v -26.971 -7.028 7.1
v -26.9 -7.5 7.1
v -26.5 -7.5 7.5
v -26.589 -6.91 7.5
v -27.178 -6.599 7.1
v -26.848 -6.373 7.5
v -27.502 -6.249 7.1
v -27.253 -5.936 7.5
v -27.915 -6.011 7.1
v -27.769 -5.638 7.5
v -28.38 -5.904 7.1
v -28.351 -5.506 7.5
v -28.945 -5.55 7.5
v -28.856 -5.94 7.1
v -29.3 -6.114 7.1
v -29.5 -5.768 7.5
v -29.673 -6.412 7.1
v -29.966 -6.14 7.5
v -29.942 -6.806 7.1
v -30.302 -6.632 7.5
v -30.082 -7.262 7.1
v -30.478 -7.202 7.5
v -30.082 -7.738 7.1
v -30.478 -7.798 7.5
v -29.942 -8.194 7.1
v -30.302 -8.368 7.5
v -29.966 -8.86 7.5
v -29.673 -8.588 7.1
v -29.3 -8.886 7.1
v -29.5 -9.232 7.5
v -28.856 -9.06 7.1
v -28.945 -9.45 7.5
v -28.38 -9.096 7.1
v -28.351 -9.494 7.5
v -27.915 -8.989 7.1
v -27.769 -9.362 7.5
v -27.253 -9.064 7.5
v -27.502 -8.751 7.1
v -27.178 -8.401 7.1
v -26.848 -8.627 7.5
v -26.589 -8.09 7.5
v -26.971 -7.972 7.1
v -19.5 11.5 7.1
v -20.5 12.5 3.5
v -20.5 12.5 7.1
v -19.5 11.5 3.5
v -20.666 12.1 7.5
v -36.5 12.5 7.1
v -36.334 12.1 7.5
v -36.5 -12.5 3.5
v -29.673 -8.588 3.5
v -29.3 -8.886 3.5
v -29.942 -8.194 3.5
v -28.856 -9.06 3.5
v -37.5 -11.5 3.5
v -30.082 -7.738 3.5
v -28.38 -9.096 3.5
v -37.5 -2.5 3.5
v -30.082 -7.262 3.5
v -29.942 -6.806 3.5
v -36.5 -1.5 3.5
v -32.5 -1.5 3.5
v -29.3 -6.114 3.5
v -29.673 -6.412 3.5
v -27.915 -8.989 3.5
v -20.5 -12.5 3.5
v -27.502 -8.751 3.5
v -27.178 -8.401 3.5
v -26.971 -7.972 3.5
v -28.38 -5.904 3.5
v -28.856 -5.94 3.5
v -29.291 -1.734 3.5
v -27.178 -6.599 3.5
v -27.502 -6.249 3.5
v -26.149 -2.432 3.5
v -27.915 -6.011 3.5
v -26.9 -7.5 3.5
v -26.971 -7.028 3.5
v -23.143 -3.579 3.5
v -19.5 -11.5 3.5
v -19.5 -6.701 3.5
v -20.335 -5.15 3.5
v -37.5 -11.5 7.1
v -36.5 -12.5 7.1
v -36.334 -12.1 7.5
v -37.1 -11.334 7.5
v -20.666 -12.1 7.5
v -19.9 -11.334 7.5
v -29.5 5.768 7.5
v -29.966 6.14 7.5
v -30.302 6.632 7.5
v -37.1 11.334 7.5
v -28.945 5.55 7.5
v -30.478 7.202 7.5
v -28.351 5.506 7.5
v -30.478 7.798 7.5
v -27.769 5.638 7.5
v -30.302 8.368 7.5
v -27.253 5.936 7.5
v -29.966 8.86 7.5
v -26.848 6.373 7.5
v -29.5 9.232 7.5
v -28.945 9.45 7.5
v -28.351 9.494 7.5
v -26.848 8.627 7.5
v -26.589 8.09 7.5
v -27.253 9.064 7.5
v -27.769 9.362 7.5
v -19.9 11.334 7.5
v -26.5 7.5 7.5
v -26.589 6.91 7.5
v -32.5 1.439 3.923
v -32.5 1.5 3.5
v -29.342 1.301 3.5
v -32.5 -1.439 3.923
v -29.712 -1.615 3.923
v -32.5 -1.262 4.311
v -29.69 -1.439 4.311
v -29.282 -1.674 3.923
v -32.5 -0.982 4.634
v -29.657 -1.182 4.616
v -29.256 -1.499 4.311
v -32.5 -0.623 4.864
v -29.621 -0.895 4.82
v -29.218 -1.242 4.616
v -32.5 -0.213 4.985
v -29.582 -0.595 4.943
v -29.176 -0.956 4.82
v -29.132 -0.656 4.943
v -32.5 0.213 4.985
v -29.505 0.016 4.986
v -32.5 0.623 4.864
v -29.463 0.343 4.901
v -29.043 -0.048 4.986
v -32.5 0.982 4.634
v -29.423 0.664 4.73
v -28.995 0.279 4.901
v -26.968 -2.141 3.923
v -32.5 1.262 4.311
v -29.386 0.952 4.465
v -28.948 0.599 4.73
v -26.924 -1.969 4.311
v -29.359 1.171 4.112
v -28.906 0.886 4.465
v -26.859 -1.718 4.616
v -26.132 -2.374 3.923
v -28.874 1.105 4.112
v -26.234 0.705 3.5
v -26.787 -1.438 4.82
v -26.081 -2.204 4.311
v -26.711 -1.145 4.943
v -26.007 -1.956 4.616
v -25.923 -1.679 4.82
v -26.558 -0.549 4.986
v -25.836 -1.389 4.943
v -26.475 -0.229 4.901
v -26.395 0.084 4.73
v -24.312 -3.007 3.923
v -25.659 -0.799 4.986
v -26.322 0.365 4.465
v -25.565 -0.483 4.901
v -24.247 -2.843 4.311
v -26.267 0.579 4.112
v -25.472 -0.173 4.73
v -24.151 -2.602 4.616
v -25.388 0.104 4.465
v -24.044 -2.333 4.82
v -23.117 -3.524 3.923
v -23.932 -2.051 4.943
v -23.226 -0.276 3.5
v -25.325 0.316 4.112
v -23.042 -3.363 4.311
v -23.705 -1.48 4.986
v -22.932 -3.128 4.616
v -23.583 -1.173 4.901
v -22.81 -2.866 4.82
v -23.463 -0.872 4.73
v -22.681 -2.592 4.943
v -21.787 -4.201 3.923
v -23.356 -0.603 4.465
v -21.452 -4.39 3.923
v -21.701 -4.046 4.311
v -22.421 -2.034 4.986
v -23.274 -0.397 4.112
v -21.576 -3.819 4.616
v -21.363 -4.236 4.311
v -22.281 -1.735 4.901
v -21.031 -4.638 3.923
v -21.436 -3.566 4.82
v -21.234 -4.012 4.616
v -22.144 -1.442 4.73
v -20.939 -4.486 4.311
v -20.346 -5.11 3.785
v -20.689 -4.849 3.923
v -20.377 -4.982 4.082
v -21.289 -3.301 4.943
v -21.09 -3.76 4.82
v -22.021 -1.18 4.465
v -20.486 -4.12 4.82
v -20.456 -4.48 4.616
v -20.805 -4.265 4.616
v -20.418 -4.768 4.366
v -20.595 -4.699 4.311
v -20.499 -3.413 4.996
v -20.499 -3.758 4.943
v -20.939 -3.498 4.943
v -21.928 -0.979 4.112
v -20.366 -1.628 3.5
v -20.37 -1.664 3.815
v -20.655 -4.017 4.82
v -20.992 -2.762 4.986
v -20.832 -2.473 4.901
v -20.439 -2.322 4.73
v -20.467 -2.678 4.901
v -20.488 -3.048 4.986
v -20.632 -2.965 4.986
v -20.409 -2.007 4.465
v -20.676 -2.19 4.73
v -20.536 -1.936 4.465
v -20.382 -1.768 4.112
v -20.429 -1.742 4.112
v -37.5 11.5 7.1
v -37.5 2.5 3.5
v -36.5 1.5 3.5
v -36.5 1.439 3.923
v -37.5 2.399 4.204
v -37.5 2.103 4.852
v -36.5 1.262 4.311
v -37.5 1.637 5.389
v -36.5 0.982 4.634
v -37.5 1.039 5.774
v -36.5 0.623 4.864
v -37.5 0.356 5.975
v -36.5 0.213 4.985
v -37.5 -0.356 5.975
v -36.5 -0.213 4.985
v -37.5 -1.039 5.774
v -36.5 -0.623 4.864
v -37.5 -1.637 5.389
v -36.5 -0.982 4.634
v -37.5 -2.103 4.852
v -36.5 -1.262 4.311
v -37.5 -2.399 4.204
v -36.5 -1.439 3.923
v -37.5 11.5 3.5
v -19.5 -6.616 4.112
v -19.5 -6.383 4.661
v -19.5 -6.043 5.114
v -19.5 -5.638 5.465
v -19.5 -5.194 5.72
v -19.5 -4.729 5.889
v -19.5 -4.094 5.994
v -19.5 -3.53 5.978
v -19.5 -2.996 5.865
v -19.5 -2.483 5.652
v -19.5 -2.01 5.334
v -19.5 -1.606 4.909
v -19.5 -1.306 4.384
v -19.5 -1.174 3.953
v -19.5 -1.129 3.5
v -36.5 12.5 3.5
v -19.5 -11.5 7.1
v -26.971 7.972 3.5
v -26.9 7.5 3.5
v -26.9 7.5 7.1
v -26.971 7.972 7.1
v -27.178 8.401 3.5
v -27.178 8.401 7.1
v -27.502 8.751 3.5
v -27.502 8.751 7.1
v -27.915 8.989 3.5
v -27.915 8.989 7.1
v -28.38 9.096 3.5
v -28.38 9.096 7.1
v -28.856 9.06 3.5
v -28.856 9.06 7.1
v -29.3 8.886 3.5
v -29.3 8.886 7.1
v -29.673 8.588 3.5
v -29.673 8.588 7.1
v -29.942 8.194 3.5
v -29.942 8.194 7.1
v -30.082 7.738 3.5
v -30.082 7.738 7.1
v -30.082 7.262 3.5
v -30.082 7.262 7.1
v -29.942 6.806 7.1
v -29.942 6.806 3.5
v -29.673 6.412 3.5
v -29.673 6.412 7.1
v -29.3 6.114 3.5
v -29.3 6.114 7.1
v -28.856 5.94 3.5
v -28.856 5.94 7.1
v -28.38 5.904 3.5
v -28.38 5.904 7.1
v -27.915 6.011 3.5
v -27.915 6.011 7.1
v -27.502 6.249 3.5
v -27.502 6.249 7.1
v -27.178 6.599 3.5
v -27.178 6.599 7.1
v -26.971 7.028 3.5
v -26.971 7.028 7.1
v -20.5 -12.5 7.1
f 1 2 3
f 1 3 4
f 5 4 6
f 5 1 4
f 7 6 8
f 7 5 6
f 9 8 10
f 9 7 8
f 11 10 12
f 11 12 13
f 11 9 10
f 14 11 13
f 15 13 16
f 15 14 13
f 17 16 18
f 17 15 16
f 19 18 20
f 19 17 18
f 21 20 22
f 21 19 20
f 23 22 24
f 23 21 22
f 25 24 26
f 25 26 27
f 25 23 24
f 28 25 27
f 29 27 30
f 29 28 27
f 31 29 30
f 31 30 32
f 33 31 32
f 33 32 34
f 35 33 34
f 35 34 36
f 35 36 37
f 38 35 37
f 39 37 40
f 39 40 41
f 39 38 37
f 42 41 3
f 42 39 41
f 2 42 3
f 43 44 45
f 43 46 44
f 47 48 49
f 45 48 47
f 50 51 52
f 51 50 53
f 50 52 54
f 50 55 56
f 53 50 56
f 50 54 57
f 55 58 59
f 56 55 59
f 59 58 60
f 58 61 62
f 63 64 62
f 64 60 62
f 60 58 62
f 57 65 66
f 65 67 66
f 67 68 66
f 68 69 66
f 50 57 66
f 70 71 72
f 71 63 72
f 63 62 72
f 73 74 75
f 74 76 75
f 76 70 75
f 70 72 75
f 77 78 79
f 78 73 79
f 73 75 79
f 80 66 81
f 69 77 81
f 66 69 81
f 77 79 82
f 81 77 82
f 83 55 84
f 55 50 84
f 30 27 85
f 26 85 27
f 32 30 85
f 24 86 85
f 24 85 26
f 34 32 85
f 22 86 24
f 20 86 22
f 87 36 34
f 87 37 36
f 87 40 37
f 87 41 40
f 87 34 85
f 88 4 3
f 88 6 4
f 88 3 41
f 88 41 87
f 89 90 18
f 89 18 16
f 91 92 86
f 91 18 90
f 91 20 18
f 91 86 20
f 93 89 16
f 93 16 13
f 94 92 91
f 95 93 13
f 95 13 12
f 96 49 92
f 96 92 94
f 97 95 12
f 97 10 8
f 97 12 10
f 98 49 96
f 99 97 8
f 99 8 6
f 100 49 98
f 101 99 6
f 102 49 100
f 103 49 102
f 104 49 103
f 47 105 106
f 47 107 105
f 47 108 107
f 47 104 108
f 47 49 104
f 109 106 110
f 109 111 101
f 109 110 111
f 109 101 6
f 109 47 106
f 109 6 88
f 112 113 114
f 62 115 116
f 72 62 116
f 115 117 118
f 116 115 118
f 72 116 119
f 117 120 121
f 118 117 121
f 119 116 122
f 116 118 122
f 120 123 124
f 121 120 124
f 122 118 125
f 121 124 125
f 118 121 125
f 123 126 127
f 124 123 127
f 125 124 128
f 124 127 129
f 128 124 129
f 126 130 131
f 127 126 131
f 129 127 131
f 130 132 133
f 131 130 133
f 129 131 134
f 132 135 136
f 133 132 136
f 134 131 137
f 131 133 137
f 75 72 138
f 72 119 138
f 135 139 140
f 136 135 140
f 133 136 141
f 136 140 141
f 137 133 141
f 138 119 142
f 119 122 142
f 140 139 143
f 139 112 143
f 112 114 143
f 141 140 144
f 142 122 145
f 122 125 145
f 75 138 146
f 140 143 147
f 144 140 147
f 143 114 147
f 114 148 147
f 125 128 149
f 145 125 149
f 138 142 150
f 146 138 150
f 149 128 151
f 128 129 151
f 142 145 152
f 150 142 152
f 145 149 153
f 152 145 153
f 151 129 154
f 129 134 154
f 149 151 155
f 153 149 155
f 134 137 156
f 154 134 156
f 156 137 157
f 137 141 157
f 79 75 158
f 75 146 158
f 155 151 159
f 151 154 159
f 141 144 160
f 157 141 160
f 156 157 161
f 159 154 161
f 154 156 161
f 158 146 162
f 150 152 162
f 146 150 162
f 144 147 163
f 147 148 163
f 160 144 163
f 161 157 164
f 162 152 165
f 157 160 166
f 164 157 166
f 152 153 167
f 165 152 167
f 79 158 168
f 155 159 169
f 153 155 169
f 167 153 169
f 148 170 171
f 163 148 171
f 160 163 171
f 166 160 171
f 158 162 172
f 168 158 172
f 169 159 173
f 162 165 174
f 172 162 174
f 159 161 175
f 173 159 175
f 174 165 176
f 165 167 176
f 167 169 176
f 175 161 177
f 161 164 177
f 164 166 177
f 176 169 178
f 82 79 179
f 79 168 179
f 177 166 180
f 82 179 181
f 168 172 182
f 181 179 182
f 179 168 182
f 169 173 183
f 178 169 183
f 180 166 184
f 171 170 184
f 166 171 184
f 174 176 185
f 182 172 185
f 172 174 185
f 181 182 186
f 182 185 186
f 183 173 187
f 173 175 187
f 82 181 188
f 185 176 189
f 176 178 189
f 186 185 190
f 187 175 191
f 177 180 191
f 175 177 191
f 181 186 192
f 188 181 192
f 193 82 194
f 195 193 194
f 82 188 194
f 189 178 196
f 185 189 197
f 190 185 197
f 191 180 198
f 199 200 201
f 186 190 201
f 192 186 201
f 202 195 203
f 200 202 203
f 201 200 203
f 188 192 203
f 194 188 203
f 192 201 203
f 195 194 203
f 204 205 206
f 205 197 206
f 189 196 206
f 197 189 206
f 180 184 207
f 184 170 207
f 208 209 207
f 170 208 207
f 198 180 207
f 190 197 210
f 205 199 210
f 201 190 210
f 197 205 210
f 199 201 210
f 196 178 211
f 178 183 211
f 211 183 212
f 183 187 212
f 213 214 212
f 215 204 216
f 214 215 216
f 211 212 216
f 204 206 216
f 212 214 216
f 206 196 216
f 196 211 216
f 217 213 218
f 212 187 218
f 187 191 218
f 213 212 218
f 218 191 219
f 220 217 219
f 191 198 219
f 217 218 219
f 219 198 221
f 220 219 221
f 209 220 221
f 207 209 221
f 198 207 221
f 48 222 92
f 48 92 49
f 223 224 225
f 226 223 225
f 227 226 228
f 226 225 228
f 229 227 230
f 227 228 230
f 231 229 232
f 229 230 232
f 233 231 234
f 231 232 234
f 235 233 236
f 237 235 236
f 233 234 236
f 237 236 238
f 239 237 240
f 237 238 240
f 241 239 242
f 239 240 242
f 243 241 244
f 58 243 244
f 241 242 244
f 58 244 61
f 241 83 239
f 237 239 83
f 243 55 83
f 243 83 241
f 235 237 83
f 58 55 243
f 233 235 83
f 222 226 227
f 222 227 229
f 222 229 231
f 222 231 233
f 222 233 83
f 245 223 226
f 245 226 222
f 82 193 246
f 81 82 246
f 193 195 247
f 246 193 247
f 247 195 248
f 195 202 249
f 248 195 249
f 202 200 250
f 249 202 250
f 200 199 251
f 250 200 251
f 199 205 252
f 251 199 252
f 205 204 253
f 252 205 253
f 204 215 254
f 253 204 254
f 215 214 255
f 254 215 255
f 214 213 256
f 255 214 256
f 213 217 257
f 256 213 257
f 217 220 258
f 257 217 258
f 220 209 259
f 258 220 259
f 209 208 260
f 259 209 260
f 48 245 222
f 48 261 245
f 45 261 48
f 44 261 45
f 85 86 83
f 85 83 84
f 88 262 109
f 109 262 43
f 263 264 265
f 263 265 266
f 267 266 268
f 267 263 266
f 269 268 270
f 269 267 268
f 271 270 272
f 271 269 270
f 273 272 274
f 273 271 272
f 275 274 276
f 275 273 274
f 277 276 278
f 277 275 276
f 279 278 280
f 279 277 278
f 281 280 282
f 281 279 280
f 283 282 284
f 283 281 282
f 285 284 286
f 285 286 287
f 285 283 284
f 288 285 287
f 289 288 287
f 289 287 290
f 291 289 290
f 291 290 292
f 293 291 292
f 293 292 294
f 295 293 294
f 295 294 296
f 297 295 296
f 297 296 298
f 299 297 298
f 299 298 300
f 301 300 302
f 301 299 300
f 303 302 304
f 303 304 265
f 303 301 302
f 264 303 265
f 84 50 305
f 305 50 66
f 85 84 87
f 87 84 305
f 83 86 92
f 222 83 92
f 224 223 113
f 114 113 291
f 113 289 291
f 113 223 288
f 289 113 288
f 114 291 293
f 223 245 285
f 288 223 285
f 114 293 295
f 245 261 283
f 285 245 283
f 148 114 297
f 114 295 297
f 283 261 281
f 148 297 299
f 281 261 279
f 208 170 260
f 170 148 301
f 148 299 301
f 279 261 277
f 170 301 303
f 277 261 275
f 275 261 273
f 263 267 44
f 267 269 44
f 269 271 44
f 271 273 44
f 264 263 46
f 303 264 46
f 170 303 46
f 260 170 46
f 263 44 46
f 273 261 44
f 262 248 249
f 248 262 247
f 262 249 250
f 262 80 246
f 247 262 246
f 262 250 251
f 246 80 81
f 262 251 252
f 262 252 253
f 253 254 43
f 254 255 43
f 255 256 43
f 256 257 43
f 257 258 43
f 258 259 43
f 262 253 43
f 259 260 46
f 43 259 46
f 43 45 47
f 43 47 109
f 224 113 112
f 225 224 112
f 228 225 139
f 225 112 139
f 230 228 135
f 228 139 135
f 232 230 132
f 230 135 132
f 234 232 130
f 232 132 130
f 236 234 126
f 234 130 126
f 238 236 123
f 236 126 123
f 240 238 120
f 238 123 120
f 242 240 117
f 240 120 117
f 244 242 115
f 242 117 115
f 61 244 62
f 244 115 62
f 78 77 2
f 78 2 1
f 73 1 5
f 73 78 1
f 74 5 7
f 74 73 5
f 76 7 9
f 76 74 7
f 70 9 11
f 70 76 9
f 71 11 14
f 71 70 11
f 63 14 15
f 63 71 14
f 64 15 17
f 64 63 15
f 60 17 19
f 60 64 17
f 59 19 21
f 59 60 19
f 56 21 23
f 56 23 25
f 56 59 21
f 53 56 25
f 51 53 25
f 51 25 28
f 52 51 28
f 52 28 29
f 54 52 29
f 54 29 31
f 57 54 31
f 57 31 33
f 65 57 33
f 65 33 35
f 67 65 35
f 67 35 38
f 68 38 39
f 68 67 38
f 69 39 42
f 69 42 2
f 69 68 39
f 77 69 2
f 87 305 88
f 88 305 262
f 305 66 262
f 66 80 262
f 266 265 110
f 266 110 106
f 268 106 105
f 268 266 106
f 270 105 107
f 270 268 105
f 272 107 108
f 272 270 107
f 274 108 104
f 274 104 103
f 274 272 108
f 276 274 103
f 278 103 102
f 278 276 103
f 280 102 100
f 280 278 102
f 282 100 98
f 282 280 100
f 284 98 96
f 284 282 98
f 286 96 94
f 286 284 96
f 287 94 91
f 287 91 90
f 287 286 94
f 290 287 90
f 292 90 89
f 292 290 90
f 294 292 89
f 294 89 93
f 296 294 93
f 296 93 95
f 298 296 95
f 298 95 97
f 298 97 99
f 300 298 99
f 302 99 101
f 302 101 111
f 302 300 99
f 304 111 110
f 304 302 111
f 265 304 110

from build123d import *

# Parameters (mm, degrees)
SKETCH027_W     = 18
SKETCH027_H     = 25
SKETCH027_R     = 1.6
PAD008_DEPTH    = 4
SKETCH028_R     = 1.5
CHAMFER011_SIZE = 1
CHAMFER033_SIZE = 1
CHAMFER039_SIZE = 0.4


with BuildPart() as part:
    # Sketch027 (on Binder) → Pad008 (new body)
    with BuildSketch(Plane.XY):
        with Locations((-28.5, 0)):
            Rectangle(SKETCH027_W, SKETCH027_H)
        with Locations((-28.5, 7.5)):
            Circle(SKETCH027_R, mode=Mode.SUBTRACT)
        with Locations((-28.5, -7.5)):
            Circle(SKETCH027_R, mode=Mode.SUBTRACT)
    extrude(amount=PAD008_DEPTH)

    # Pipe002: sweep along a path in Sketch029
    with BuildLine(Plane(origin=(0, 0, 0), x_dir=(1, 0, 0), z_dir=(0, 0, -1))) as pipe002_path:
        Line((-37.5, 0), (-32.5, 0))
        ThreePointArc((-32.5, 0), (-25.713288, 0.99695), (-19.5, 3.903567))
        Line((-19.5, 3.903567), (0, 16.774801))
    # Sketch028 (on Face4 of Pad008) → Pipe002 (sweep, cut)
    with BuildSketch(Plane(origin=(-37.5, 0, 0), x_dir=(0, -1, 0), z_dir=(-1, 0, 0))):
        Circle(SKETCH028_R)
    sweep(path=pipe002_path.line, mode=Mode.SUBTRACT)

    # Chamfer011
    chamfer011_edges = [part.edges().sort_by_distance(p)[0] for p in [
        (-37.5, 0, 1.5),
        (-19.5, -2.700188, 1.106038),
    ]]
    chamfer(chamfer011_edges, length=CHAMFER011_SIZE)

    # Chamfer033
    chamfer033_edges = [part.edges().sort_by_distance(p)[0] for p in [
        (-37.5, -12.5, 2),
        (-19.5, -12.5, 2),
        (-19.5, 12.5, 2),
        (-37.5, 12.5, 2),
    ]]
    chamfer(chamfer033_edges, length=CHAMFER033_SIZE)

    # Chamfer039
    chamfer039_edges = [part.edges().sort_by_distance(p)[0] for p in [
        (-28.5, 12.5, 4),
        (-37, 12, 4),
        (-20, 12, 4),
        (-37.5, 0, 4),
        (-19.5, 0, 4),
        (-37, -12, 4),
        (-20, -12, 4),
        (-28.5, -12.5, 4),
        (-30.1, 7.5, 4),
        (-30.1, -7.5, 4),
    ]]
    chamfer(chamfer039_edges, length=CHAMFER039_SIZE)


with BuildPart() as part_1:
    # Body005 placement: moved
    add(part.part.moved(Location((0, 0, 3.5))))


solid = part_1.part
